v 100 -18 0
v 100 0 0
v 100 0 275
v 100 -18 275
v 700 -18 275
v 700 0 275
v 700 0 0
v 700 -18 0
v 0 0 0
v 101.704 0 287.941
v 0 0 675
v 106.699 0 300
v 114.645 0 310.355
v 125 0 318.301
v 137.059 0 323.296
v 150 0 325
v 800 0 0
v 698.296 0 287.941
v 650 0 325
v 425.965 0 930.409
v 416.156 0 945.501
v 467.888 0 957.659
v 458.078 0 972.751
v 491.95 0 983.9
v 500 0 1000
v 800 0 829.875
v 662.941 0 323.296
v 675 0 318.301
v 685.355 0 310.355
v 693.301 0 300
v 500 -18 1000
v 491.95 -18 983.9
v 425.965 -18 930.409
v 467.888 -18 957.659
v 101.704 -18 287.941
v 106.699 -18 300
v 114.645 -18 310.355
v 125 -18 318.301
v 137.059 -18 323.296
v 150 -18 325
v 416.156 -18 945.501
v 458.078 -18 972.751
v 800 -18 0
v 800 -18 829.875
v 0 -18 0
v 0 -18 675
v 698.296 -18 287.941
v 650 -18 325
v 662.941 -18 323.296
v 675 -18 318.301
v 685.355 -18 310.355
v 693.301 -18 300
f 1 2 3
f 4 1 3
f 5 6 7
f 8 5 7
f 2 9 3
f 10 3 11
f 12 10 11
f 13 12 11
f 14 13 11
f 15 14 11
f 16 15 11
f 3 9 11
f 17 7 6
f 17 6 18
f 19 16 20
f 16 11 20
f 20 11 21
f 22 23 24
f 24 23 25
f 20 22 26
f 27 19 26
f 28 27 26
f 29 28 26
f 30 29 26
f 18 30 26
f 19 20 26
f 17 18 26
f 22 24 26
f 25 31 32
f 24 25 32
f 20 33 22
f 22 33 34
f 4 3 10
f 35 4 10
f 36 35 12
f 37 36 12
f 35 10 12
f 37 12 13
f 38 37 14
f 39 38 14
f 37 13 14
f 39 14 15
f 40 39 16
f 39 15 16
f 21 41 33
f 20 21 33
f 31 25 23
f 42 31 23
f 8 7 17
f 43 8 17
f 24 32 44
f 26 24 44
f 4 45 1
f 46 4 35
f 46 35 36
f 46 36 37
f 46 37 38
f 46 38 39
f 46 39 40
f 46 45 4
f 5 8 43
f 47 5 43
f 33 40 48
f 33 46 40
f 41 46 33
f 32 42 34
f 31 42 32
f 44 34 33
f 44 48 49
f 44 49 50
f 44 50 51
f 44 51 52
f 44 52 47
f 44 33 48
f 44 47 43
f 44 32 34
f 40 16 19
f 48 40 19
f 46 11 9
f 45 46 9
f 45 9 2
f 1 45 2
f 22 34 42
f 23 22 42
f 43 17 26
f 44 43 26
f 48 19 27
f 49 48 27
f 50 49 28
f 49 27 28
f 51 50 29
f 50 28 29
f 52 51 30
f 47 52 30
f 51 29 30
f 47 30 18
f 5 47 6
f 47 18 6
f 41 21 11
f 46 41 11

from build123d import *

# Parameters (mm, degrees)
F1_DEPTH = 18
F5_DEPTH = 18
F7_DEPTH = 18


with BuildPart() as f1:
    # F0 (on Front) → F1 (new body)
    with BuildSketch(Plane.XZ):
        with BuildLine():
            Line((0, 675), (0, 0))
            Line((0, 0), (100, 0))
            Line((100, 0), (100, 275))
            ThreePointArc((100, 275), (114.644661, 310.355339), (150, 325))
            Line((150, 325), (650, 325))
            ThreePointArc((650, 325), (685.355339, 310.355339), (700, 275))
            Line((700, 275), (700, 0))
            Line((700, 0), (800, 0))
            Line((800, 0), (800, 850))
            Line((800, 850), (500, 1000))
            Line((500, 1000), (0, 675))
        make_face()
    extrude(amount=F1_DEPTH)

    # F4 (on face) → F5 (cut)
    with BuildSketch(Plane.XZ.offset(18)):
        Polygon((458.077819, 972.750582), (416.155638, 945.501165), (425.965429, 930.40918), (467.887609, 957.658597), align=None)
    extrude(amount=-F5_DEPTH, mode=Mode.SUBTRACT)

    # F6 (on face) → F7 (cut, through all)
    with BuildSketch(Plane.XZ.offset(18)):
        Polygon((500, 1000), (491.950155, 983.900311), (849.721032, 805.014872), (857.770876, 821.114562), align=None)
    extrude(amount=-F7_DEPTH, mode=Mode.SUBTRACT)


solid = f1.part
